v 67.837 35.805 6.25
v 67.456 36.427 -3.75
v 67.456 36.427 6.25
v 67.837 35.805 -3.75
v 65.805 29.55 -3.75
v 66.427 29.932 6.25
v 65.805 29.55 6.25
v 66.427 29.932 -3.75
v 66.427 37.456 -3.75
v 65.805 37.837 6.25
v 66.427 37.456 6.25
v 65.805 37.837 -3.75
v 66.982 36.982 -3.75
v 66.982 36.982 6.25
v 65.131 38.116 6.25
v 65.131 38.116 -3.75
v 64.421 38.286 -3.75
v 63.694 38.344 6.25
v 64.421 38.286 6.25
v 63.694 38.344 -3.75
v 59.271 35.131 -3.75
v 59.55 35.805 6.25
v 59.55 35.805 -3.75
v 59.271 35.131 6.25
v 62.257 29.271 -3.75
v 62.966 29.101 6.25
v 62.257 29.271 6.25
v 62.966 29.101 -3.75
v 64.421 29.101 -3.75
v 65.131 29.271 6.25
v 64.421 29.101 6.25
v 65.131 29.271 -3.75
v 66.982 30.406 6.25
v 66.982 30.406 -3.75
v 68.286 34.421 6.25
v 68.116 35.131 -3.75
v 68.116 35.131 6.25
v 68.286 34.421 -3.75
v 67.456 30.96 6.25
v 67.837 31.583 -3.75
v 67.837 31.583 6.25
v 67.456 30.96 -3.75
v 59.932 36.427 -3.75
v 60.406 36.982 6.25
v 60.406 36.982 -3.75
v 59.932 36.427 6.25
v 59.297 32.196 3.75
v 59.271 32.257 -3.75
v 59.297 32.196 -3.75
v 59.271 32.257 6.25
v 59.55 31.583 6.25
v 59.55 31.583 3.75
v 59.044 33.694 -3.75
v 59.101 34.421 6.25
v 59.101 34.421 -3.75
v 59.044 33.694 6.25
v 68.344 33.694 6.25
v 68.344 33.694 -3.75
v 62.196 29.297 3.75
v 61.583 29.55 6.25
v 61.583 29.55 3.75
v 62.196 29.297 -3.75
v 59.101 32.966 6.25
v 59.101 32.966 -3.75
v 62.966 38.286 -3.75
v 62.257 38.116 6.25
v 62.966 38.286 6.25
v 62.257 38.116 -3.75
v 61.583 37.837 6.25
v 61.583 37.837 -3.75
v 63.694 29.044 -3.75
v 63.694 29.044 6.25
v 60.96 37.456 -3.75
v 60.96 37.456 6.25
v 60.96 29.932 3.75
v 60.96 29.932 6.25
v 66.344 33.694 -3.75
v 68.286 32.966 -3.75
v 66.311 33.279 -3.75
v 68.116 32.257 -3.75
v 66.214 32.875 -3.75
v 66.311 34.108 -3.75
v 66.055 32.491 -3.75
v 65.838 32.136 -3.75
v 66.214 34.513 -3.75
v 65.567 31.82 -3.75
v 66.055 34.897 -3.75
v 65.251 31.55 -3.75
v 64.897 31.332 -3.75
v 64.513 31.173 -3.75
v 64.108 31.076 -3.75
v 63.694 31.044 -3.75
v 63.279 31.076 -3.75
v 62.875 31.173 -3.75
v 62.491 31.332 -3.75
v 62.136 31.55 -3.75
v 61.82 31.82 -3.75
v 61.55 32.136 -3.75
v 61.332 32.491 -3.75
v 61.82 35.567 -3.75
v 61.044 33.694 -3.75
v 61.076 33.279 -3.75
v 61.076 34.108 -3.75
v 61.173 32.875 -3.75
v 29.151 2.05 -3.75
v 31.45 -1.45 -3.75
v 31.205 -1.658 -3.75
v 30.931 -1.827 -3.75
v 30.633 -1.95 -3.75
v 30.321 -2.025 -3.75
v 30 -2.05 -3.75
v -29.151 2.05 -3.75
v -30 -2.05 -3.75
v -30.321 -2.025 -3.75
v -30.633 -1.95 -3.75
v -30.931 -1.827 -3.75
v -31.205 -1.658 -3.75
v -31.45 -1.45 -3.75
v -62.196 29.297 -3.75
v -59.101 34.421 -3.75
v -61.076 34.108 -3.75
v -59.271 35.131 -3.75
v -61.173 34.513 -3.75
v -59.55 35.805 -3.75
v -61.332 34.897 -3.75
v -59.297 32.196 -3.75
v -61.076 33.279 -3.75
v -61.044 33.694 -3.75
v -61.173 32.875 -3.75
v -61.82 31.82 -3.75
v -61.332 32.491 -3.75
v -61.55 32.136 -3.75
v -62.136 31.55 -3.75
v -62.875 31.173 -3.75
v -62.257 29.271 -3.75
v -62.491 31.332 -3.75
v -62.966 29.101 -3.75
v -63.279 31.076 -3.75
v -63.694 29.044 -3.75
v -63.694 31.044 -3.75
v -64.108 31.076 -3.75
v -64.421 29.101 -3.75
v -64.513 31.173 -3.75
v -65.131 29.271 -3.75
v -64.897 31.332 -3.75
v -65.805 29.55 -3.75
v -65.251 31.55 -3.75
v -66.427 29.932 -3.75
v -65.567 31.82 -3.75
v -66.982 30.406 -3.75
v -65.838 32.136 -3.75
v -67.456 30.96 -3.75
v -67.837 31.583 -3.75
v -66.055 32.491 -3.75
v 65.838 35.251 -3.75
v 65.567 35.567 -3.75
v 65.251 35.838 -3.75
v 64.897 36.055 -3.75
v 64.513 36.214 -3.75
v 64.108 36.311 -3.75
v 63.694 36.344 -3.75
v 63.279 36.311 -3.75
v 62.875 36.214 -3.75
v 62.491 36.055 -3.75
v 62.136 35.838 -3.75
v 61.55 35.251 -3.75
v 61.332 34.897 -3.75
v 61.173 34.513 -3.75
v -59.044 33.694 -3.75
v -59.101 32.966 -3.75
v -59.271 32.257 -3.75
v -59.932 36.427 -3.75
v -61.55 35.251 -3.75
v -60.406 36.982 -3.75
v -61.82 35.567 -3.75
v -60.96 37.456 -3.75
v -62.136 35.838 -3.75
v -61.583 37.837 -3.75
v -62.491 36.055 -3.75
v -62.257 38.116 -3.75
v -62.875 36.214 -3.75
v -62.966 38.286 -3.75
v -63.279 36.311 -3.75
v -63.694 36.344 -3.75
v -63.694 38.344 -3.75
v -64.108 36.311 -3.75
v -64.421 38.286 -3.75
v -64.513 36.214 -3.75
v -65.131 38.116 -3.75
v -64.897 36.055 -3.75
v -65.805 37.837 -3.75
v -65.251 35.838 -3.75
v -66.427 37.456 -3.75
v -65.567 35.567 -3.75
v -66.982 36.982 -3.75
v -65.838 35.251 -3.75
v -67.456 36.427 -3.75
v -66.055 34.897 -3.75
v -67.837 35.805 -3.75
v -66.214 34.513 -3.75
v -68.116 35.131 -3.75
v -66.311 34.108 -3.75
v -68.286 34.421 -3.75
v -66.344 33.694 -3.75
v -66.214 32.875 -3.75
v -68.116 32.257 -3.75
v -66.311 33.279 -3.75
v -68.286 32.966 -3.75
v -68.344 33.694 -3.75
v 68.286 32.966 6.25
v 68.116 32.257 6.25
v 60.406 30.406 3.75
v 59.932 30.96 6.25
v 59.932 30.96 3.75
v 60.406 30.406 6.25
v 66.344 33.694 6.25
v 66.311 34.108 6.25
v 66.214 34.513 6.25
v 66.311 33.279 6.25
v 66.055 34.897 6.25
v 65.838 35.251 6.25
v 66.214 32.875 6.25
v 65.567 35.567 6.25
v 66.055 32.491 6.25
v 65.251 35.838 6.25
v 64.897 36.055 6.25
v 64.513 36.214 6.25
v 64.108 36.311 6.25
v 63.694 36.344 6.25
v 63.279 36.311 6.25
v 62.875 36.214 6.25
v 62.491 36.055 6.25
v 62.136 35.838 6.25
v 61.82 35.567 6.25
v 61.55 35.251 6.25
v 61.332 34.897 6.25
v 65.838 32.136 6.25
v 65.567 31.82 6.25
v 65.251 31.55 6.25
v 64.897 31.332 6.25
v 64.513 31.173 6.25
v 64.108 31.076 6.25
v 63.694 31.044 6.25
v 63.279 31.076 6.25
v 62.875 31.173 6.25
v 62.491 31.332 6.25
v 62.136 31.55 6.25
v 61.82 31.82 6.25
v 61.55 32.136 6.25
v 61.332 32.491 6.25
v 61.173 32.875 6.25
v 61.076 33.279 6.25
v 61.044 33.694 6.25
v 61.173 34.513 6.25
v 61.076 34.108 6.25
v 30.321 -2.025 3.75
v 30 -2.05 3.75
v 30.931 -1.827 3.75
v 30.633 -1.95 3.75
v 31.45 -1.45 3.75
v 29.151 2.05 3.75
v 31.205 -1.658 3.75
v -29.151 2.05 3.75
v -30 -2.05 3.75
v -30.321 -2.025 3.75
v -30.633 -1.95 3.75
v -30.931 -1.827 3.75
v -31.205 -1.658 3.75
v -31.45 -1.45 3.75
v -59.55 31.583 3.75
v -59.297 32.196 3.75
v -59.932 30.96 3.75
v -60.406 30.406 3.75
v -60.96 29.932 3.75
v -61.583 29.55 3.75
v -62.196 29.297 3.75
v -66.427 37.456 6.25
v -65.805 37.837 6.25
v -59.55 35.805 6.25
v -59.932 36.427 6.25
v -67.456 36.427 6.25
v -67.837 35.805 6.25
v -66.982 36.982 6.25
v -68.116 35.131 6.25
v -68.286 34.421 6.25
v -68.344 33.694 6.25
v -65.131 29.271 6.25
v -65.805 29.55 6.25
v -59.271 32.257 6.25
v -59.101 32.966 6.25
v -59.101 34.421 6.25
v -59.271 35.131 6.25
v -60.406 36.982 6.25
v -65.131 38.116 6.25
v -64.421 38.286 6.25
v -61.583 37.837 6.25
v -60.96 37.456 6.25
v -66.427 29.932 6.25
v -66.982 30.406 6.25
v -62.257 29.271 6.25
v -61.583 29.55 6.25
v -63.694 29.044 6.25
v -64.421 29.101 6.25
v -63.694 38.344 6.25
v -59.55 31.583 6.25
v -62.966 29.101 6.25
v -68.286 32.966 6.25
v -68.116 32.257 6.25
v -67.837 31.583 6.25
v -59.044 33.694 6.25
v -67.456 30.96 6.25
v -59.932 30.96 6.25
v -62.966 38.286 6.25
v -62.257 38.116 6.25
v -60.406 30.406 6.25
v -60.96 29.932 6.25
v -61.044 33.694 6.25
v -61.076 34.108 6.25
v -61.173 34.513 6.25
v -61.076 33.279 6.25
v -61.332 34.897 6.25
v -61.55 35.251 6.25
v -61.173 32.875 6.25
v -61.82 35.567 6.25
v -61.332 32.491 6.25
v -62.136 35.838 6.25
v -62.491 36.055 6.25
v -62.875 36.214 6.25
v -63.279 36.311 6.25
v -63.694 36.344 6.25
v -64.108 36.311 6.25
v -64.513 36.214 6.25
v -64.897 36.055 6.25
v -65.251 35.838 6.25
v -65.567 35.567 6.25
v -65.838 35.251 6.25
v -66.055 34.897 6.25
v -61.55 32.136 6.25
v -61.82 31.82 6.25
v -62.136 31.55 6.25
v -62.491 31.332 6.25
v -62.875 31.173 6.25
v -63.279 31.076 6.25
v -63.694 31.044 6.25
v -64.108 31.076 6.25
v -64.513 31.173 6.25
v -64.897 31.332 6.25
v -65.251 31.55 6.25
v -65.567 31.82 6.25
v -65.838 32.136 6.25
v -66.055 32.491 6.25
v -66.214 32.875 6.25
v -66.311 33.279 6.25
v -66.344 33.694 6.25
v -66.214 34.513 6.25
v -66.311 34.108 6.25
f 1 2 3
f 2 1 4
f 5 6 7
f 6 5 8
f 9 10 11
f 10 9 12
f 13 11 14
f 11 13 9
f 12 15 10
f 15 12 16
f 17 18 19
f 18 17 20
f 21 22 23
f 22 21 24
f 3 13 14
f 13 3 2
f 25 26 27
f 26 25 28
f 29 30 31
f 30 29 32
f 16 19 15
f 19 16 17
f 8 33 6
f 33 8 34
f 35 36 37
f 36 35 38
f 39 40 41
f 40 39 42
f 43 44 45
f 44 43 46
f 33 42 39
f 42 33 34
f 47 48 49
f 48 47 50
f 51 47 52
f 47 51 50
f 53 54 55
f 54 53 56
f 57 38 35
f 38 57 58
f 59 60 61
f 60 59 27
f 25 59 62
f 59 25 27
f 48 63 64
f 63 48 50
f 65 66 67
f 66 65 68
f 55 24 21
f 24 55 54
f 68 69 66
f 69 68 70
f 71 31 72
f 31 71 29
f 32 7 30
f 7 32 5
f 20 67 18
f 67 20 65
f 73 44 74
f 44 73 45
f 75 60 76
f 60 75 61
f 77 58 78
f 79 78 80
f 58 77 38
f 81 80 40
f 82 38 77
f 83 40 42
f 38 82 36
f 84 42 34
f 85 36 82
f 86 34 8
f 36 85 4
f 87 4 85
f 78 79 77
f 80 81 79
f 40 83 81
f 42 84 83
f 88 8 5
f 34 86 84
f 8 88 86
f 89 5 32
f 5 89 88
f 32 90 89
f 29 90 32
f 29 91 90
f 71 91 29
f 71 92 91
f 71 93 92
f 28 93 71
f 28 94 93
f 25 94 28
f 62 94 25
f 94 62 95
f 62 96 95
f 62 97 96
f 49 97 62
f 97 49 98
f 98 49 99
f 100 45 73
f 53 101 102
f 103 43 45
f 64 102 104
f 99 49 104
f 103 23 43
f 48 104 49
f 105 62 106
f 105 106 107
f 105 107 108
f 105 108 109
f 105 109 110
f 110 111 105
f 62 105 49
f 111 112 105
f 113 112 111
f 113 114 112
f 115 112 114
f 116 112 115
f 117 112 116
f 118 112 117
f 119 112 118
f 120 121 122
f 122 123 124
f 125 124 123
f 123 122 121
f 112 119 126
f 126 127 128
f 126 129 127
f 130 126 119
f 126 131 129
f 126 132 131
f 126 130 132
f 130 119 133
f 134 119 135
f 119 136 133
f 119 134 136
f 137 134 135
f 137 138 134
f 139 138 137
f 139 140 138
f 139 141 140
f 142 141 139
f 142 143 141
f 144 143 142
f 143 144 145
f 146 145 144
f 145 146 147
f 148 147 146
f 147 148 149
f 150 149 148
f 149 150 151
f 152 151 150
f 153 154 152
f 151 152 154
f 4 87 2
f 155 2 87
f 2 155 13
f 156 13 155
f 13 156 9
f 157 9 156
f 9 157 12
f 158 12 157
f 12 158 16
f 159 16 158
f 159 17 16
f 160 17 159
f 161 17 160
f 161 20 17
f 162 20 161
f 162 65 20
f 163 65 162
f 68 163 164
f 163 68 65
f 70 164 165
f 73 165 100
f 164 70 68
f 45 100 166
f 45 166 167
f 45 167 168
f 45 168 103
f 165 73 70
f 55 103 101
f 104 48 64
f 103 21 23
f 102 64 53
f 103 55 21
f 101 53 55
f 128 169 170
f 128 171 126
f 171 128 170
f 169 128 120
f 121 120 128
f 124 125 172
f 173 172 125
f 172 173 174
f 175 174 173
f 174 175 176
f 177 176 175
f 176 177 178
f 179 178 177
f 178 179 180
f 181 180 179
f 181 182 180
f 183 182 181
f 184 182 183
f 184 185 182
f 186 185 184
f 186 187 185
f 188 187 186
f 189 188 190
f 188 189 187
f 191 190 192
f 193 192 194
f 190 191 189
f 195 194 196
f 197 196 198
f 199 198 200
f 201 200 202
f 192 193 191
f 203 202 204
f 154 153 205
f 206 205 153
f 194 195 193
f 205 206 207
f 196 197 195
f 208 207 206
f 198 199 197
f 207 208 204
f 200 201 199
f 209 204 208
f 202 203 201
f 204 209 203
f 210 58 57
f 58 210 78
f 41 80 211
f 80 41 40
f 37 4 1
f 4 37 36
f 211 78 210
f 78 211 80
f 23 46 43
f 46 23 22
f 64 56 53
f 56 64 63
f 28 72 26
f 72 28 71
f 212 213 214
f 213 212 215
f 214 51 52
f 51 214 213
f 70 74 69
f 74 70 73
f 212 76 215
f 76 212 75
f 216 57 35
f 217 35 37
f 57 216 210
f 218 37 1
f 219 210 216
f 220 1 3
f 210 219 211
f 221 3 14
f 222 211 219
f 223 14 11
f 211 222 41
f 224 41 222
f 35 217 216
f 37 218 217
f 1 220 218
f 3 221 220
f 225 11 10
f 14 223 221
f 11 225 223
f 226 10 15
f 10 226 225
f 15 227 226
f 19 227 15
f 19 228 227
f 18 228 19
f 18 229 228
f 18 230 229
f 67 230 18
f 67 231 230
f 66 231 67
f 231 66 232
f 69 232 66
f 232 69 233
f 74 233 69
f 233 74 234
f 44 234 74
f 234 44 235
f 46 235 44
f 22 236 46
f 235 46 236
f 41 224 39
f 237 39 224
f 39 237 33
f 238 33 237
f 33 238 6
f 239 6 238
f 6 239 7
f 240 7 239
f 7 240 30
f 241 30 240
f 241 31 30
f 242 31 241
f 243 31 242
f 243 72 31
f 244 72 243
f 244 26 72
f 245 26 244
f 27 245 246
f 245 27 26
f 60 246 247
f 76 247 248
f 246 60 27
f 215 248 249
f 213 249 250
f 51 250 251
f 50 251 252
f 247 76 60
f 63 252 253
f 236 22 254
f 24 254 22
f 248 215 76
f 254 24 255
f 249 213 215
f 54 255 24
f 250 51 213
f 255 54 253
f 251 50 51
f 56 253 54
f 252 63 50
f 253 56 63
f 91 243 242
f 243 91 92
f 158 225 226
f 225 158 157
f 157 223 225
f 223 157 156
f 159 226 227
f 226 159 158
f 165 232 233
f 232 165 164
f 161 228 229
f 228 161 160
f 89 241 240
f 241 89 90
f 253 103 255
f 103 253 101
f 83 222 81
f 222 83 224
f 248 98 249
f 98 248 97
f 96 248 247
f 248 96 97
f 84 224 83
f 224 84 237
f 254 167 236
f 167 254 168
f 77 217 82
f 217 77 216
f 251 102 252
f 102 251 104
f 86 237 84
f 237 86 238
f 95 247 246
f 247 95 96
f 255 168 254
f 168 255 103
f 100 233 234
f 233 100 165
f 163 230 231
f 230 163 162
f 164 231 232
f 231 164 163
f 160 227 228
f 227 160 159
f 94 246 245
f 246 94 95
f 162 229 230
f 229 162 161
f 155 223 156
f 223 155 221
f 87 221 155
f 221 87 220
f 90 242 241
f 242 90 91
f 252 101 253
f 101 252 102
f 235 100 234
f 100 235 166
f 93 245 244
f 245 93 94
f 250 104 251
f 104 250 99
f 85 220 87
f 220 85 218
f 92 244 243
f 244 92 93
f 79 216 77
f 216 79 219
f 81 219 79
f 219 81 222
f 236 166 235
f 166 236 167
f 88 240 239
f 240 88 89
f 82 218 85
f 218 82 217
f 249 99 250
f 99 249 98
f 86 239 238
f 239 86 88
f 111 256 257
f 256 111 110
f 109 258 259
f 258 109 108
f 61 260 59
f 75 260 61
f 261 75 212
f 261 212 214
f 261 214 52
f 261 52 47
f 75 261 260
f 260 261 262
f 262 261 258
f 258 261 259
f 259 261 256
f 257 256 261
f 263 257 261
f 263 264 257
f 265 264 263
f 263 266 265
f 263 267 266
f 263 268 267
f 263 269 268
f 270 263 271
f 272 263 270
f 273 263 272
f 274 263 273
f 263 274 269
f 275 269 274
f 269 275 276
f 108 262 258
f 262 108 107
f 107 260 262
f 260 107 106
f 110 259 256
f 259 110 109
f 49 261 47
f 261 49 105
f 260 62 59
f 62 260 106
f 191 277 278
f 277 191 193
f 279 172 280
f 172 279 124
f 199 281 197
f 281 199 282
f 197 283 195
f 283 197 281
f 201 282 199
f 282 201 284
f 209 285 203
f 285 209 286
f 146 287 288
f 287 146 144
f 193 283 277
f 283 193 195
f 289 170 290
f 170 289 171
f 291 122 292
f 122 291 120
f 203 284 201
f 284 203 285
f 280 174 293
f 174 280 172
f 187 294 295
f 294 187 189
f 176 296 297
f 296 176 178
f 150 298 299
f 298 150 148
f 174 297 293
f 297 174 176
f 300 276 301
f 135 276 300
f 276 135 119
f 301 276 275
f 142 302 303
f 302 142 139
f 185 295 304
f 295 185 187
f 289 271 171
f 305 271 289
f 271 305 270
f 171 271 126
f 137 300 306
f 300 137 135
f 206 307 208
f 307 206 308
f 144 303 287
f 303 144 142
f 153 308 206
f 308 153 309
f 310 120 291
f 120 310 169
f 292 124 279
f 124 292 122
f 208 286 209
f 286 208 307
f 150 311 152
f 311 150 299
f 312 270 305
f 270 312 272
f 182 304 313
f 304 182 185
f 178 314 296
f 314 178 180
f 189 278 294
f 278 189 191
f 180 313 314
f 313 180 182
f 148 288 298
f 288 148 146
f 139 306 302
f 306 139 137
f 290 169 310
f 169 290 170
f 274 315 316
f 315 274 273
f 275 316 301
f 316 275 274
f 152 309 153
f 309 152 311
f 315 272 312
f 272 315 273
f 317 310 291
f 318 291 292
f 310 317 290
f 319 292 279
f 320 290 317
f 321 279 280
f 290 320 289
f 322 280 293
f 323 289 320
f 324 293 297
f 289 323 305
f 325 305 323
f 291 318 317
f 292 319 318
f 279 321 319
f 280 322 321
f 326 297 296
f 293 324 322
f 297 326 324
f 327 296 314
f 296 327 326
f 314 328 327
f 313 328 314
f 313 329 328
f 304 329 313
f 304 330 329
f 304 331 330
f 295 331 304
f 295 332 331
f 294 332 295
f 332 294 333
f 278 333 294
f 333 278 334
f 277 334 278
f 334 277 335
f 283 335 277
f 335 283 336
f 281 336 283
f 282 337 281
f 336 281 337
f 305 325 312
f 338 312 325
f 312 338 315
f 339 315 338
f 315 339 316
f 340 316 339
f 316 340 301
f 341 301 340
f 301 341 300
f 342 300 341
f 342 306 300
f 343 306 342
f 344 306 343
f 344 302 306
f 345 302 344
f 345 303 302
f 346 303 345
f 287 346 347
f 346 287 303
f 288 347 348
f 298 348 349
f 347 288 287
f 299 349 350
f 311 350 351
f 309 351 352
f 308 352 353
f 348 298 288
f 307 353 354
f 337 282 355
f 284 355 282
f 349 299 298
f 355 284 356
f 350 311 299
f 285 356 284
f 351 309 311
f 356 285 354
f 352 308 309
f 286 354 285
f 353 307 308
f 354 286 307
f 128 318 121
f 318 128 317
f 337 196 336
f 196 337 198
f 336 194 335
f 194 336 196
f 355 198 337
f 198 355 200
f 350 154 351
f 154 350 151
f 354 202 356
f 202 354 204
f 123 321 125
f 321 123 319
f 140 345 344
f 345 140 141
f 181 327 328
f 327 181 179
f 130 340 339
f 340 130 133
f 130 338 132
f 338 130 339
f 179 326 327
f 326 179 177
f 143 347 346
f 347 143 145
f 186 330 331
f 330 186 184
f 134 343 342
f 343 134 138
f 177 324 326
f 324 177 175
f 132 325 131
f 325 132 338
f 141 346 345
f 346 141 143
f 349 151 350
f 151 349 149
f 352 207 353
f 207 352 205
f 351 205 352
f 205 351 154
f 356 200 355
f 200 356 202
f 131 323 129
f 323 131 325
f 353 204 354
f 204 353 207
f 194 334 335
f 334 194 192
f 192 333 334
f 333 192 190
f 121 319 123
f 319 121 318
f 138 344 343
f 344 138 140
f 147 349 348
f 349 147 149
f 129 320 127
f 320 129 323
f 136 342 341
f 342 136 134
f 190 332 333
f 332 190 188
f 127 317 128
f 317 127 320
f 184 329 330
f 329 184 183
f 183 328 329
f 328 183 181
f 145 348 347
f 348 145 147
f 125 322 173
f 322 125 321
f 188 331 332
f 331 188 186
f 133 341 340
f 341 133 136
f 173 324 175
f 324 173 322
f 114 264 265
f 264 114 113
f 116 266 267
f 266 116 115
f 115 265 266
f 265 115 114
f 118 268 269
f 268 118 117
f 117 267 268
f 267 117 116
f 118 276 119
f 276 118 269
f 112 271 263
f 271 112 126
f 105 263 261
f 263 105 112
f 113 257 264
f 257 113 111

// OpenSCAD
/********************************************************************
 * TinkerLib : Landing gear bracket for 450 size helicopter
 * https://github.com/tinkerology/tinkerlib
 * By Scott P Leslie (https://twitter.com/tinkerology)
 * Licensed Under Creative Commons Attributions Share Alike 
 * (http://creativecommons.org/licenses/by-sa/3.0/deed.en_US)
 *******************************************************************/

THICKNESS=4.1;
WIDTH=7.5;
ANGLE=45;
CROSSBAR_LENGTH=60;
DOWNBAR_LENGTH=45;
SKID_RADIUS=2.65;
SKID_LENGTH=10;
DETAIL=40;
SKID_HOLDER_THICKNESS=2;

module drawDownBar()
{
	translate([0,0,-1*WIDTH/2])
	cylinder(WIDTH, THICKNESS/2, THICKNESS/2,$fn=DETAIL);

	translate([DOWNBAR_LENGTH/2,0,0])
	cube([DOWNBAR_LENGTH,THICKNESS,WIDTH], center=true);

	translate([DOWNBAR_LENGTH+SKID_RADIUS,0,-1*WIDTH/2])
	difference()
	{
		cylinder(SKID_LENGTH, SKID_RADIUS+SKID_HOLDER_THICKNESS, SKID_RADIUS+SKID_HOLDER_THICKNESS,$fn=DETAIL);

		cylinder(SKID_LENGTH, SKID_RADIUS, SKID_RADIUS,$fn=DETAIL);
	}
}

cube([CROSSBAR_LENGTH,THICKNESS,WIDTH],center=true);

translate([CROSSBAR_LENGTH/2,0,0])
rotate([0,0,ANGLE])
drawDownBar();

translate([-1*CROSSBAR_LENGTH/2,0,0])
rotate([0,0,180-ANGLE])
drawDownBar();

// Draw lower cross bar
//translate([0, DOWNBAR_LENGTH/2,0])
//cube([CROSSBAR_LENGTH*2,THICKNESS/2,WIDTH],center=true);
